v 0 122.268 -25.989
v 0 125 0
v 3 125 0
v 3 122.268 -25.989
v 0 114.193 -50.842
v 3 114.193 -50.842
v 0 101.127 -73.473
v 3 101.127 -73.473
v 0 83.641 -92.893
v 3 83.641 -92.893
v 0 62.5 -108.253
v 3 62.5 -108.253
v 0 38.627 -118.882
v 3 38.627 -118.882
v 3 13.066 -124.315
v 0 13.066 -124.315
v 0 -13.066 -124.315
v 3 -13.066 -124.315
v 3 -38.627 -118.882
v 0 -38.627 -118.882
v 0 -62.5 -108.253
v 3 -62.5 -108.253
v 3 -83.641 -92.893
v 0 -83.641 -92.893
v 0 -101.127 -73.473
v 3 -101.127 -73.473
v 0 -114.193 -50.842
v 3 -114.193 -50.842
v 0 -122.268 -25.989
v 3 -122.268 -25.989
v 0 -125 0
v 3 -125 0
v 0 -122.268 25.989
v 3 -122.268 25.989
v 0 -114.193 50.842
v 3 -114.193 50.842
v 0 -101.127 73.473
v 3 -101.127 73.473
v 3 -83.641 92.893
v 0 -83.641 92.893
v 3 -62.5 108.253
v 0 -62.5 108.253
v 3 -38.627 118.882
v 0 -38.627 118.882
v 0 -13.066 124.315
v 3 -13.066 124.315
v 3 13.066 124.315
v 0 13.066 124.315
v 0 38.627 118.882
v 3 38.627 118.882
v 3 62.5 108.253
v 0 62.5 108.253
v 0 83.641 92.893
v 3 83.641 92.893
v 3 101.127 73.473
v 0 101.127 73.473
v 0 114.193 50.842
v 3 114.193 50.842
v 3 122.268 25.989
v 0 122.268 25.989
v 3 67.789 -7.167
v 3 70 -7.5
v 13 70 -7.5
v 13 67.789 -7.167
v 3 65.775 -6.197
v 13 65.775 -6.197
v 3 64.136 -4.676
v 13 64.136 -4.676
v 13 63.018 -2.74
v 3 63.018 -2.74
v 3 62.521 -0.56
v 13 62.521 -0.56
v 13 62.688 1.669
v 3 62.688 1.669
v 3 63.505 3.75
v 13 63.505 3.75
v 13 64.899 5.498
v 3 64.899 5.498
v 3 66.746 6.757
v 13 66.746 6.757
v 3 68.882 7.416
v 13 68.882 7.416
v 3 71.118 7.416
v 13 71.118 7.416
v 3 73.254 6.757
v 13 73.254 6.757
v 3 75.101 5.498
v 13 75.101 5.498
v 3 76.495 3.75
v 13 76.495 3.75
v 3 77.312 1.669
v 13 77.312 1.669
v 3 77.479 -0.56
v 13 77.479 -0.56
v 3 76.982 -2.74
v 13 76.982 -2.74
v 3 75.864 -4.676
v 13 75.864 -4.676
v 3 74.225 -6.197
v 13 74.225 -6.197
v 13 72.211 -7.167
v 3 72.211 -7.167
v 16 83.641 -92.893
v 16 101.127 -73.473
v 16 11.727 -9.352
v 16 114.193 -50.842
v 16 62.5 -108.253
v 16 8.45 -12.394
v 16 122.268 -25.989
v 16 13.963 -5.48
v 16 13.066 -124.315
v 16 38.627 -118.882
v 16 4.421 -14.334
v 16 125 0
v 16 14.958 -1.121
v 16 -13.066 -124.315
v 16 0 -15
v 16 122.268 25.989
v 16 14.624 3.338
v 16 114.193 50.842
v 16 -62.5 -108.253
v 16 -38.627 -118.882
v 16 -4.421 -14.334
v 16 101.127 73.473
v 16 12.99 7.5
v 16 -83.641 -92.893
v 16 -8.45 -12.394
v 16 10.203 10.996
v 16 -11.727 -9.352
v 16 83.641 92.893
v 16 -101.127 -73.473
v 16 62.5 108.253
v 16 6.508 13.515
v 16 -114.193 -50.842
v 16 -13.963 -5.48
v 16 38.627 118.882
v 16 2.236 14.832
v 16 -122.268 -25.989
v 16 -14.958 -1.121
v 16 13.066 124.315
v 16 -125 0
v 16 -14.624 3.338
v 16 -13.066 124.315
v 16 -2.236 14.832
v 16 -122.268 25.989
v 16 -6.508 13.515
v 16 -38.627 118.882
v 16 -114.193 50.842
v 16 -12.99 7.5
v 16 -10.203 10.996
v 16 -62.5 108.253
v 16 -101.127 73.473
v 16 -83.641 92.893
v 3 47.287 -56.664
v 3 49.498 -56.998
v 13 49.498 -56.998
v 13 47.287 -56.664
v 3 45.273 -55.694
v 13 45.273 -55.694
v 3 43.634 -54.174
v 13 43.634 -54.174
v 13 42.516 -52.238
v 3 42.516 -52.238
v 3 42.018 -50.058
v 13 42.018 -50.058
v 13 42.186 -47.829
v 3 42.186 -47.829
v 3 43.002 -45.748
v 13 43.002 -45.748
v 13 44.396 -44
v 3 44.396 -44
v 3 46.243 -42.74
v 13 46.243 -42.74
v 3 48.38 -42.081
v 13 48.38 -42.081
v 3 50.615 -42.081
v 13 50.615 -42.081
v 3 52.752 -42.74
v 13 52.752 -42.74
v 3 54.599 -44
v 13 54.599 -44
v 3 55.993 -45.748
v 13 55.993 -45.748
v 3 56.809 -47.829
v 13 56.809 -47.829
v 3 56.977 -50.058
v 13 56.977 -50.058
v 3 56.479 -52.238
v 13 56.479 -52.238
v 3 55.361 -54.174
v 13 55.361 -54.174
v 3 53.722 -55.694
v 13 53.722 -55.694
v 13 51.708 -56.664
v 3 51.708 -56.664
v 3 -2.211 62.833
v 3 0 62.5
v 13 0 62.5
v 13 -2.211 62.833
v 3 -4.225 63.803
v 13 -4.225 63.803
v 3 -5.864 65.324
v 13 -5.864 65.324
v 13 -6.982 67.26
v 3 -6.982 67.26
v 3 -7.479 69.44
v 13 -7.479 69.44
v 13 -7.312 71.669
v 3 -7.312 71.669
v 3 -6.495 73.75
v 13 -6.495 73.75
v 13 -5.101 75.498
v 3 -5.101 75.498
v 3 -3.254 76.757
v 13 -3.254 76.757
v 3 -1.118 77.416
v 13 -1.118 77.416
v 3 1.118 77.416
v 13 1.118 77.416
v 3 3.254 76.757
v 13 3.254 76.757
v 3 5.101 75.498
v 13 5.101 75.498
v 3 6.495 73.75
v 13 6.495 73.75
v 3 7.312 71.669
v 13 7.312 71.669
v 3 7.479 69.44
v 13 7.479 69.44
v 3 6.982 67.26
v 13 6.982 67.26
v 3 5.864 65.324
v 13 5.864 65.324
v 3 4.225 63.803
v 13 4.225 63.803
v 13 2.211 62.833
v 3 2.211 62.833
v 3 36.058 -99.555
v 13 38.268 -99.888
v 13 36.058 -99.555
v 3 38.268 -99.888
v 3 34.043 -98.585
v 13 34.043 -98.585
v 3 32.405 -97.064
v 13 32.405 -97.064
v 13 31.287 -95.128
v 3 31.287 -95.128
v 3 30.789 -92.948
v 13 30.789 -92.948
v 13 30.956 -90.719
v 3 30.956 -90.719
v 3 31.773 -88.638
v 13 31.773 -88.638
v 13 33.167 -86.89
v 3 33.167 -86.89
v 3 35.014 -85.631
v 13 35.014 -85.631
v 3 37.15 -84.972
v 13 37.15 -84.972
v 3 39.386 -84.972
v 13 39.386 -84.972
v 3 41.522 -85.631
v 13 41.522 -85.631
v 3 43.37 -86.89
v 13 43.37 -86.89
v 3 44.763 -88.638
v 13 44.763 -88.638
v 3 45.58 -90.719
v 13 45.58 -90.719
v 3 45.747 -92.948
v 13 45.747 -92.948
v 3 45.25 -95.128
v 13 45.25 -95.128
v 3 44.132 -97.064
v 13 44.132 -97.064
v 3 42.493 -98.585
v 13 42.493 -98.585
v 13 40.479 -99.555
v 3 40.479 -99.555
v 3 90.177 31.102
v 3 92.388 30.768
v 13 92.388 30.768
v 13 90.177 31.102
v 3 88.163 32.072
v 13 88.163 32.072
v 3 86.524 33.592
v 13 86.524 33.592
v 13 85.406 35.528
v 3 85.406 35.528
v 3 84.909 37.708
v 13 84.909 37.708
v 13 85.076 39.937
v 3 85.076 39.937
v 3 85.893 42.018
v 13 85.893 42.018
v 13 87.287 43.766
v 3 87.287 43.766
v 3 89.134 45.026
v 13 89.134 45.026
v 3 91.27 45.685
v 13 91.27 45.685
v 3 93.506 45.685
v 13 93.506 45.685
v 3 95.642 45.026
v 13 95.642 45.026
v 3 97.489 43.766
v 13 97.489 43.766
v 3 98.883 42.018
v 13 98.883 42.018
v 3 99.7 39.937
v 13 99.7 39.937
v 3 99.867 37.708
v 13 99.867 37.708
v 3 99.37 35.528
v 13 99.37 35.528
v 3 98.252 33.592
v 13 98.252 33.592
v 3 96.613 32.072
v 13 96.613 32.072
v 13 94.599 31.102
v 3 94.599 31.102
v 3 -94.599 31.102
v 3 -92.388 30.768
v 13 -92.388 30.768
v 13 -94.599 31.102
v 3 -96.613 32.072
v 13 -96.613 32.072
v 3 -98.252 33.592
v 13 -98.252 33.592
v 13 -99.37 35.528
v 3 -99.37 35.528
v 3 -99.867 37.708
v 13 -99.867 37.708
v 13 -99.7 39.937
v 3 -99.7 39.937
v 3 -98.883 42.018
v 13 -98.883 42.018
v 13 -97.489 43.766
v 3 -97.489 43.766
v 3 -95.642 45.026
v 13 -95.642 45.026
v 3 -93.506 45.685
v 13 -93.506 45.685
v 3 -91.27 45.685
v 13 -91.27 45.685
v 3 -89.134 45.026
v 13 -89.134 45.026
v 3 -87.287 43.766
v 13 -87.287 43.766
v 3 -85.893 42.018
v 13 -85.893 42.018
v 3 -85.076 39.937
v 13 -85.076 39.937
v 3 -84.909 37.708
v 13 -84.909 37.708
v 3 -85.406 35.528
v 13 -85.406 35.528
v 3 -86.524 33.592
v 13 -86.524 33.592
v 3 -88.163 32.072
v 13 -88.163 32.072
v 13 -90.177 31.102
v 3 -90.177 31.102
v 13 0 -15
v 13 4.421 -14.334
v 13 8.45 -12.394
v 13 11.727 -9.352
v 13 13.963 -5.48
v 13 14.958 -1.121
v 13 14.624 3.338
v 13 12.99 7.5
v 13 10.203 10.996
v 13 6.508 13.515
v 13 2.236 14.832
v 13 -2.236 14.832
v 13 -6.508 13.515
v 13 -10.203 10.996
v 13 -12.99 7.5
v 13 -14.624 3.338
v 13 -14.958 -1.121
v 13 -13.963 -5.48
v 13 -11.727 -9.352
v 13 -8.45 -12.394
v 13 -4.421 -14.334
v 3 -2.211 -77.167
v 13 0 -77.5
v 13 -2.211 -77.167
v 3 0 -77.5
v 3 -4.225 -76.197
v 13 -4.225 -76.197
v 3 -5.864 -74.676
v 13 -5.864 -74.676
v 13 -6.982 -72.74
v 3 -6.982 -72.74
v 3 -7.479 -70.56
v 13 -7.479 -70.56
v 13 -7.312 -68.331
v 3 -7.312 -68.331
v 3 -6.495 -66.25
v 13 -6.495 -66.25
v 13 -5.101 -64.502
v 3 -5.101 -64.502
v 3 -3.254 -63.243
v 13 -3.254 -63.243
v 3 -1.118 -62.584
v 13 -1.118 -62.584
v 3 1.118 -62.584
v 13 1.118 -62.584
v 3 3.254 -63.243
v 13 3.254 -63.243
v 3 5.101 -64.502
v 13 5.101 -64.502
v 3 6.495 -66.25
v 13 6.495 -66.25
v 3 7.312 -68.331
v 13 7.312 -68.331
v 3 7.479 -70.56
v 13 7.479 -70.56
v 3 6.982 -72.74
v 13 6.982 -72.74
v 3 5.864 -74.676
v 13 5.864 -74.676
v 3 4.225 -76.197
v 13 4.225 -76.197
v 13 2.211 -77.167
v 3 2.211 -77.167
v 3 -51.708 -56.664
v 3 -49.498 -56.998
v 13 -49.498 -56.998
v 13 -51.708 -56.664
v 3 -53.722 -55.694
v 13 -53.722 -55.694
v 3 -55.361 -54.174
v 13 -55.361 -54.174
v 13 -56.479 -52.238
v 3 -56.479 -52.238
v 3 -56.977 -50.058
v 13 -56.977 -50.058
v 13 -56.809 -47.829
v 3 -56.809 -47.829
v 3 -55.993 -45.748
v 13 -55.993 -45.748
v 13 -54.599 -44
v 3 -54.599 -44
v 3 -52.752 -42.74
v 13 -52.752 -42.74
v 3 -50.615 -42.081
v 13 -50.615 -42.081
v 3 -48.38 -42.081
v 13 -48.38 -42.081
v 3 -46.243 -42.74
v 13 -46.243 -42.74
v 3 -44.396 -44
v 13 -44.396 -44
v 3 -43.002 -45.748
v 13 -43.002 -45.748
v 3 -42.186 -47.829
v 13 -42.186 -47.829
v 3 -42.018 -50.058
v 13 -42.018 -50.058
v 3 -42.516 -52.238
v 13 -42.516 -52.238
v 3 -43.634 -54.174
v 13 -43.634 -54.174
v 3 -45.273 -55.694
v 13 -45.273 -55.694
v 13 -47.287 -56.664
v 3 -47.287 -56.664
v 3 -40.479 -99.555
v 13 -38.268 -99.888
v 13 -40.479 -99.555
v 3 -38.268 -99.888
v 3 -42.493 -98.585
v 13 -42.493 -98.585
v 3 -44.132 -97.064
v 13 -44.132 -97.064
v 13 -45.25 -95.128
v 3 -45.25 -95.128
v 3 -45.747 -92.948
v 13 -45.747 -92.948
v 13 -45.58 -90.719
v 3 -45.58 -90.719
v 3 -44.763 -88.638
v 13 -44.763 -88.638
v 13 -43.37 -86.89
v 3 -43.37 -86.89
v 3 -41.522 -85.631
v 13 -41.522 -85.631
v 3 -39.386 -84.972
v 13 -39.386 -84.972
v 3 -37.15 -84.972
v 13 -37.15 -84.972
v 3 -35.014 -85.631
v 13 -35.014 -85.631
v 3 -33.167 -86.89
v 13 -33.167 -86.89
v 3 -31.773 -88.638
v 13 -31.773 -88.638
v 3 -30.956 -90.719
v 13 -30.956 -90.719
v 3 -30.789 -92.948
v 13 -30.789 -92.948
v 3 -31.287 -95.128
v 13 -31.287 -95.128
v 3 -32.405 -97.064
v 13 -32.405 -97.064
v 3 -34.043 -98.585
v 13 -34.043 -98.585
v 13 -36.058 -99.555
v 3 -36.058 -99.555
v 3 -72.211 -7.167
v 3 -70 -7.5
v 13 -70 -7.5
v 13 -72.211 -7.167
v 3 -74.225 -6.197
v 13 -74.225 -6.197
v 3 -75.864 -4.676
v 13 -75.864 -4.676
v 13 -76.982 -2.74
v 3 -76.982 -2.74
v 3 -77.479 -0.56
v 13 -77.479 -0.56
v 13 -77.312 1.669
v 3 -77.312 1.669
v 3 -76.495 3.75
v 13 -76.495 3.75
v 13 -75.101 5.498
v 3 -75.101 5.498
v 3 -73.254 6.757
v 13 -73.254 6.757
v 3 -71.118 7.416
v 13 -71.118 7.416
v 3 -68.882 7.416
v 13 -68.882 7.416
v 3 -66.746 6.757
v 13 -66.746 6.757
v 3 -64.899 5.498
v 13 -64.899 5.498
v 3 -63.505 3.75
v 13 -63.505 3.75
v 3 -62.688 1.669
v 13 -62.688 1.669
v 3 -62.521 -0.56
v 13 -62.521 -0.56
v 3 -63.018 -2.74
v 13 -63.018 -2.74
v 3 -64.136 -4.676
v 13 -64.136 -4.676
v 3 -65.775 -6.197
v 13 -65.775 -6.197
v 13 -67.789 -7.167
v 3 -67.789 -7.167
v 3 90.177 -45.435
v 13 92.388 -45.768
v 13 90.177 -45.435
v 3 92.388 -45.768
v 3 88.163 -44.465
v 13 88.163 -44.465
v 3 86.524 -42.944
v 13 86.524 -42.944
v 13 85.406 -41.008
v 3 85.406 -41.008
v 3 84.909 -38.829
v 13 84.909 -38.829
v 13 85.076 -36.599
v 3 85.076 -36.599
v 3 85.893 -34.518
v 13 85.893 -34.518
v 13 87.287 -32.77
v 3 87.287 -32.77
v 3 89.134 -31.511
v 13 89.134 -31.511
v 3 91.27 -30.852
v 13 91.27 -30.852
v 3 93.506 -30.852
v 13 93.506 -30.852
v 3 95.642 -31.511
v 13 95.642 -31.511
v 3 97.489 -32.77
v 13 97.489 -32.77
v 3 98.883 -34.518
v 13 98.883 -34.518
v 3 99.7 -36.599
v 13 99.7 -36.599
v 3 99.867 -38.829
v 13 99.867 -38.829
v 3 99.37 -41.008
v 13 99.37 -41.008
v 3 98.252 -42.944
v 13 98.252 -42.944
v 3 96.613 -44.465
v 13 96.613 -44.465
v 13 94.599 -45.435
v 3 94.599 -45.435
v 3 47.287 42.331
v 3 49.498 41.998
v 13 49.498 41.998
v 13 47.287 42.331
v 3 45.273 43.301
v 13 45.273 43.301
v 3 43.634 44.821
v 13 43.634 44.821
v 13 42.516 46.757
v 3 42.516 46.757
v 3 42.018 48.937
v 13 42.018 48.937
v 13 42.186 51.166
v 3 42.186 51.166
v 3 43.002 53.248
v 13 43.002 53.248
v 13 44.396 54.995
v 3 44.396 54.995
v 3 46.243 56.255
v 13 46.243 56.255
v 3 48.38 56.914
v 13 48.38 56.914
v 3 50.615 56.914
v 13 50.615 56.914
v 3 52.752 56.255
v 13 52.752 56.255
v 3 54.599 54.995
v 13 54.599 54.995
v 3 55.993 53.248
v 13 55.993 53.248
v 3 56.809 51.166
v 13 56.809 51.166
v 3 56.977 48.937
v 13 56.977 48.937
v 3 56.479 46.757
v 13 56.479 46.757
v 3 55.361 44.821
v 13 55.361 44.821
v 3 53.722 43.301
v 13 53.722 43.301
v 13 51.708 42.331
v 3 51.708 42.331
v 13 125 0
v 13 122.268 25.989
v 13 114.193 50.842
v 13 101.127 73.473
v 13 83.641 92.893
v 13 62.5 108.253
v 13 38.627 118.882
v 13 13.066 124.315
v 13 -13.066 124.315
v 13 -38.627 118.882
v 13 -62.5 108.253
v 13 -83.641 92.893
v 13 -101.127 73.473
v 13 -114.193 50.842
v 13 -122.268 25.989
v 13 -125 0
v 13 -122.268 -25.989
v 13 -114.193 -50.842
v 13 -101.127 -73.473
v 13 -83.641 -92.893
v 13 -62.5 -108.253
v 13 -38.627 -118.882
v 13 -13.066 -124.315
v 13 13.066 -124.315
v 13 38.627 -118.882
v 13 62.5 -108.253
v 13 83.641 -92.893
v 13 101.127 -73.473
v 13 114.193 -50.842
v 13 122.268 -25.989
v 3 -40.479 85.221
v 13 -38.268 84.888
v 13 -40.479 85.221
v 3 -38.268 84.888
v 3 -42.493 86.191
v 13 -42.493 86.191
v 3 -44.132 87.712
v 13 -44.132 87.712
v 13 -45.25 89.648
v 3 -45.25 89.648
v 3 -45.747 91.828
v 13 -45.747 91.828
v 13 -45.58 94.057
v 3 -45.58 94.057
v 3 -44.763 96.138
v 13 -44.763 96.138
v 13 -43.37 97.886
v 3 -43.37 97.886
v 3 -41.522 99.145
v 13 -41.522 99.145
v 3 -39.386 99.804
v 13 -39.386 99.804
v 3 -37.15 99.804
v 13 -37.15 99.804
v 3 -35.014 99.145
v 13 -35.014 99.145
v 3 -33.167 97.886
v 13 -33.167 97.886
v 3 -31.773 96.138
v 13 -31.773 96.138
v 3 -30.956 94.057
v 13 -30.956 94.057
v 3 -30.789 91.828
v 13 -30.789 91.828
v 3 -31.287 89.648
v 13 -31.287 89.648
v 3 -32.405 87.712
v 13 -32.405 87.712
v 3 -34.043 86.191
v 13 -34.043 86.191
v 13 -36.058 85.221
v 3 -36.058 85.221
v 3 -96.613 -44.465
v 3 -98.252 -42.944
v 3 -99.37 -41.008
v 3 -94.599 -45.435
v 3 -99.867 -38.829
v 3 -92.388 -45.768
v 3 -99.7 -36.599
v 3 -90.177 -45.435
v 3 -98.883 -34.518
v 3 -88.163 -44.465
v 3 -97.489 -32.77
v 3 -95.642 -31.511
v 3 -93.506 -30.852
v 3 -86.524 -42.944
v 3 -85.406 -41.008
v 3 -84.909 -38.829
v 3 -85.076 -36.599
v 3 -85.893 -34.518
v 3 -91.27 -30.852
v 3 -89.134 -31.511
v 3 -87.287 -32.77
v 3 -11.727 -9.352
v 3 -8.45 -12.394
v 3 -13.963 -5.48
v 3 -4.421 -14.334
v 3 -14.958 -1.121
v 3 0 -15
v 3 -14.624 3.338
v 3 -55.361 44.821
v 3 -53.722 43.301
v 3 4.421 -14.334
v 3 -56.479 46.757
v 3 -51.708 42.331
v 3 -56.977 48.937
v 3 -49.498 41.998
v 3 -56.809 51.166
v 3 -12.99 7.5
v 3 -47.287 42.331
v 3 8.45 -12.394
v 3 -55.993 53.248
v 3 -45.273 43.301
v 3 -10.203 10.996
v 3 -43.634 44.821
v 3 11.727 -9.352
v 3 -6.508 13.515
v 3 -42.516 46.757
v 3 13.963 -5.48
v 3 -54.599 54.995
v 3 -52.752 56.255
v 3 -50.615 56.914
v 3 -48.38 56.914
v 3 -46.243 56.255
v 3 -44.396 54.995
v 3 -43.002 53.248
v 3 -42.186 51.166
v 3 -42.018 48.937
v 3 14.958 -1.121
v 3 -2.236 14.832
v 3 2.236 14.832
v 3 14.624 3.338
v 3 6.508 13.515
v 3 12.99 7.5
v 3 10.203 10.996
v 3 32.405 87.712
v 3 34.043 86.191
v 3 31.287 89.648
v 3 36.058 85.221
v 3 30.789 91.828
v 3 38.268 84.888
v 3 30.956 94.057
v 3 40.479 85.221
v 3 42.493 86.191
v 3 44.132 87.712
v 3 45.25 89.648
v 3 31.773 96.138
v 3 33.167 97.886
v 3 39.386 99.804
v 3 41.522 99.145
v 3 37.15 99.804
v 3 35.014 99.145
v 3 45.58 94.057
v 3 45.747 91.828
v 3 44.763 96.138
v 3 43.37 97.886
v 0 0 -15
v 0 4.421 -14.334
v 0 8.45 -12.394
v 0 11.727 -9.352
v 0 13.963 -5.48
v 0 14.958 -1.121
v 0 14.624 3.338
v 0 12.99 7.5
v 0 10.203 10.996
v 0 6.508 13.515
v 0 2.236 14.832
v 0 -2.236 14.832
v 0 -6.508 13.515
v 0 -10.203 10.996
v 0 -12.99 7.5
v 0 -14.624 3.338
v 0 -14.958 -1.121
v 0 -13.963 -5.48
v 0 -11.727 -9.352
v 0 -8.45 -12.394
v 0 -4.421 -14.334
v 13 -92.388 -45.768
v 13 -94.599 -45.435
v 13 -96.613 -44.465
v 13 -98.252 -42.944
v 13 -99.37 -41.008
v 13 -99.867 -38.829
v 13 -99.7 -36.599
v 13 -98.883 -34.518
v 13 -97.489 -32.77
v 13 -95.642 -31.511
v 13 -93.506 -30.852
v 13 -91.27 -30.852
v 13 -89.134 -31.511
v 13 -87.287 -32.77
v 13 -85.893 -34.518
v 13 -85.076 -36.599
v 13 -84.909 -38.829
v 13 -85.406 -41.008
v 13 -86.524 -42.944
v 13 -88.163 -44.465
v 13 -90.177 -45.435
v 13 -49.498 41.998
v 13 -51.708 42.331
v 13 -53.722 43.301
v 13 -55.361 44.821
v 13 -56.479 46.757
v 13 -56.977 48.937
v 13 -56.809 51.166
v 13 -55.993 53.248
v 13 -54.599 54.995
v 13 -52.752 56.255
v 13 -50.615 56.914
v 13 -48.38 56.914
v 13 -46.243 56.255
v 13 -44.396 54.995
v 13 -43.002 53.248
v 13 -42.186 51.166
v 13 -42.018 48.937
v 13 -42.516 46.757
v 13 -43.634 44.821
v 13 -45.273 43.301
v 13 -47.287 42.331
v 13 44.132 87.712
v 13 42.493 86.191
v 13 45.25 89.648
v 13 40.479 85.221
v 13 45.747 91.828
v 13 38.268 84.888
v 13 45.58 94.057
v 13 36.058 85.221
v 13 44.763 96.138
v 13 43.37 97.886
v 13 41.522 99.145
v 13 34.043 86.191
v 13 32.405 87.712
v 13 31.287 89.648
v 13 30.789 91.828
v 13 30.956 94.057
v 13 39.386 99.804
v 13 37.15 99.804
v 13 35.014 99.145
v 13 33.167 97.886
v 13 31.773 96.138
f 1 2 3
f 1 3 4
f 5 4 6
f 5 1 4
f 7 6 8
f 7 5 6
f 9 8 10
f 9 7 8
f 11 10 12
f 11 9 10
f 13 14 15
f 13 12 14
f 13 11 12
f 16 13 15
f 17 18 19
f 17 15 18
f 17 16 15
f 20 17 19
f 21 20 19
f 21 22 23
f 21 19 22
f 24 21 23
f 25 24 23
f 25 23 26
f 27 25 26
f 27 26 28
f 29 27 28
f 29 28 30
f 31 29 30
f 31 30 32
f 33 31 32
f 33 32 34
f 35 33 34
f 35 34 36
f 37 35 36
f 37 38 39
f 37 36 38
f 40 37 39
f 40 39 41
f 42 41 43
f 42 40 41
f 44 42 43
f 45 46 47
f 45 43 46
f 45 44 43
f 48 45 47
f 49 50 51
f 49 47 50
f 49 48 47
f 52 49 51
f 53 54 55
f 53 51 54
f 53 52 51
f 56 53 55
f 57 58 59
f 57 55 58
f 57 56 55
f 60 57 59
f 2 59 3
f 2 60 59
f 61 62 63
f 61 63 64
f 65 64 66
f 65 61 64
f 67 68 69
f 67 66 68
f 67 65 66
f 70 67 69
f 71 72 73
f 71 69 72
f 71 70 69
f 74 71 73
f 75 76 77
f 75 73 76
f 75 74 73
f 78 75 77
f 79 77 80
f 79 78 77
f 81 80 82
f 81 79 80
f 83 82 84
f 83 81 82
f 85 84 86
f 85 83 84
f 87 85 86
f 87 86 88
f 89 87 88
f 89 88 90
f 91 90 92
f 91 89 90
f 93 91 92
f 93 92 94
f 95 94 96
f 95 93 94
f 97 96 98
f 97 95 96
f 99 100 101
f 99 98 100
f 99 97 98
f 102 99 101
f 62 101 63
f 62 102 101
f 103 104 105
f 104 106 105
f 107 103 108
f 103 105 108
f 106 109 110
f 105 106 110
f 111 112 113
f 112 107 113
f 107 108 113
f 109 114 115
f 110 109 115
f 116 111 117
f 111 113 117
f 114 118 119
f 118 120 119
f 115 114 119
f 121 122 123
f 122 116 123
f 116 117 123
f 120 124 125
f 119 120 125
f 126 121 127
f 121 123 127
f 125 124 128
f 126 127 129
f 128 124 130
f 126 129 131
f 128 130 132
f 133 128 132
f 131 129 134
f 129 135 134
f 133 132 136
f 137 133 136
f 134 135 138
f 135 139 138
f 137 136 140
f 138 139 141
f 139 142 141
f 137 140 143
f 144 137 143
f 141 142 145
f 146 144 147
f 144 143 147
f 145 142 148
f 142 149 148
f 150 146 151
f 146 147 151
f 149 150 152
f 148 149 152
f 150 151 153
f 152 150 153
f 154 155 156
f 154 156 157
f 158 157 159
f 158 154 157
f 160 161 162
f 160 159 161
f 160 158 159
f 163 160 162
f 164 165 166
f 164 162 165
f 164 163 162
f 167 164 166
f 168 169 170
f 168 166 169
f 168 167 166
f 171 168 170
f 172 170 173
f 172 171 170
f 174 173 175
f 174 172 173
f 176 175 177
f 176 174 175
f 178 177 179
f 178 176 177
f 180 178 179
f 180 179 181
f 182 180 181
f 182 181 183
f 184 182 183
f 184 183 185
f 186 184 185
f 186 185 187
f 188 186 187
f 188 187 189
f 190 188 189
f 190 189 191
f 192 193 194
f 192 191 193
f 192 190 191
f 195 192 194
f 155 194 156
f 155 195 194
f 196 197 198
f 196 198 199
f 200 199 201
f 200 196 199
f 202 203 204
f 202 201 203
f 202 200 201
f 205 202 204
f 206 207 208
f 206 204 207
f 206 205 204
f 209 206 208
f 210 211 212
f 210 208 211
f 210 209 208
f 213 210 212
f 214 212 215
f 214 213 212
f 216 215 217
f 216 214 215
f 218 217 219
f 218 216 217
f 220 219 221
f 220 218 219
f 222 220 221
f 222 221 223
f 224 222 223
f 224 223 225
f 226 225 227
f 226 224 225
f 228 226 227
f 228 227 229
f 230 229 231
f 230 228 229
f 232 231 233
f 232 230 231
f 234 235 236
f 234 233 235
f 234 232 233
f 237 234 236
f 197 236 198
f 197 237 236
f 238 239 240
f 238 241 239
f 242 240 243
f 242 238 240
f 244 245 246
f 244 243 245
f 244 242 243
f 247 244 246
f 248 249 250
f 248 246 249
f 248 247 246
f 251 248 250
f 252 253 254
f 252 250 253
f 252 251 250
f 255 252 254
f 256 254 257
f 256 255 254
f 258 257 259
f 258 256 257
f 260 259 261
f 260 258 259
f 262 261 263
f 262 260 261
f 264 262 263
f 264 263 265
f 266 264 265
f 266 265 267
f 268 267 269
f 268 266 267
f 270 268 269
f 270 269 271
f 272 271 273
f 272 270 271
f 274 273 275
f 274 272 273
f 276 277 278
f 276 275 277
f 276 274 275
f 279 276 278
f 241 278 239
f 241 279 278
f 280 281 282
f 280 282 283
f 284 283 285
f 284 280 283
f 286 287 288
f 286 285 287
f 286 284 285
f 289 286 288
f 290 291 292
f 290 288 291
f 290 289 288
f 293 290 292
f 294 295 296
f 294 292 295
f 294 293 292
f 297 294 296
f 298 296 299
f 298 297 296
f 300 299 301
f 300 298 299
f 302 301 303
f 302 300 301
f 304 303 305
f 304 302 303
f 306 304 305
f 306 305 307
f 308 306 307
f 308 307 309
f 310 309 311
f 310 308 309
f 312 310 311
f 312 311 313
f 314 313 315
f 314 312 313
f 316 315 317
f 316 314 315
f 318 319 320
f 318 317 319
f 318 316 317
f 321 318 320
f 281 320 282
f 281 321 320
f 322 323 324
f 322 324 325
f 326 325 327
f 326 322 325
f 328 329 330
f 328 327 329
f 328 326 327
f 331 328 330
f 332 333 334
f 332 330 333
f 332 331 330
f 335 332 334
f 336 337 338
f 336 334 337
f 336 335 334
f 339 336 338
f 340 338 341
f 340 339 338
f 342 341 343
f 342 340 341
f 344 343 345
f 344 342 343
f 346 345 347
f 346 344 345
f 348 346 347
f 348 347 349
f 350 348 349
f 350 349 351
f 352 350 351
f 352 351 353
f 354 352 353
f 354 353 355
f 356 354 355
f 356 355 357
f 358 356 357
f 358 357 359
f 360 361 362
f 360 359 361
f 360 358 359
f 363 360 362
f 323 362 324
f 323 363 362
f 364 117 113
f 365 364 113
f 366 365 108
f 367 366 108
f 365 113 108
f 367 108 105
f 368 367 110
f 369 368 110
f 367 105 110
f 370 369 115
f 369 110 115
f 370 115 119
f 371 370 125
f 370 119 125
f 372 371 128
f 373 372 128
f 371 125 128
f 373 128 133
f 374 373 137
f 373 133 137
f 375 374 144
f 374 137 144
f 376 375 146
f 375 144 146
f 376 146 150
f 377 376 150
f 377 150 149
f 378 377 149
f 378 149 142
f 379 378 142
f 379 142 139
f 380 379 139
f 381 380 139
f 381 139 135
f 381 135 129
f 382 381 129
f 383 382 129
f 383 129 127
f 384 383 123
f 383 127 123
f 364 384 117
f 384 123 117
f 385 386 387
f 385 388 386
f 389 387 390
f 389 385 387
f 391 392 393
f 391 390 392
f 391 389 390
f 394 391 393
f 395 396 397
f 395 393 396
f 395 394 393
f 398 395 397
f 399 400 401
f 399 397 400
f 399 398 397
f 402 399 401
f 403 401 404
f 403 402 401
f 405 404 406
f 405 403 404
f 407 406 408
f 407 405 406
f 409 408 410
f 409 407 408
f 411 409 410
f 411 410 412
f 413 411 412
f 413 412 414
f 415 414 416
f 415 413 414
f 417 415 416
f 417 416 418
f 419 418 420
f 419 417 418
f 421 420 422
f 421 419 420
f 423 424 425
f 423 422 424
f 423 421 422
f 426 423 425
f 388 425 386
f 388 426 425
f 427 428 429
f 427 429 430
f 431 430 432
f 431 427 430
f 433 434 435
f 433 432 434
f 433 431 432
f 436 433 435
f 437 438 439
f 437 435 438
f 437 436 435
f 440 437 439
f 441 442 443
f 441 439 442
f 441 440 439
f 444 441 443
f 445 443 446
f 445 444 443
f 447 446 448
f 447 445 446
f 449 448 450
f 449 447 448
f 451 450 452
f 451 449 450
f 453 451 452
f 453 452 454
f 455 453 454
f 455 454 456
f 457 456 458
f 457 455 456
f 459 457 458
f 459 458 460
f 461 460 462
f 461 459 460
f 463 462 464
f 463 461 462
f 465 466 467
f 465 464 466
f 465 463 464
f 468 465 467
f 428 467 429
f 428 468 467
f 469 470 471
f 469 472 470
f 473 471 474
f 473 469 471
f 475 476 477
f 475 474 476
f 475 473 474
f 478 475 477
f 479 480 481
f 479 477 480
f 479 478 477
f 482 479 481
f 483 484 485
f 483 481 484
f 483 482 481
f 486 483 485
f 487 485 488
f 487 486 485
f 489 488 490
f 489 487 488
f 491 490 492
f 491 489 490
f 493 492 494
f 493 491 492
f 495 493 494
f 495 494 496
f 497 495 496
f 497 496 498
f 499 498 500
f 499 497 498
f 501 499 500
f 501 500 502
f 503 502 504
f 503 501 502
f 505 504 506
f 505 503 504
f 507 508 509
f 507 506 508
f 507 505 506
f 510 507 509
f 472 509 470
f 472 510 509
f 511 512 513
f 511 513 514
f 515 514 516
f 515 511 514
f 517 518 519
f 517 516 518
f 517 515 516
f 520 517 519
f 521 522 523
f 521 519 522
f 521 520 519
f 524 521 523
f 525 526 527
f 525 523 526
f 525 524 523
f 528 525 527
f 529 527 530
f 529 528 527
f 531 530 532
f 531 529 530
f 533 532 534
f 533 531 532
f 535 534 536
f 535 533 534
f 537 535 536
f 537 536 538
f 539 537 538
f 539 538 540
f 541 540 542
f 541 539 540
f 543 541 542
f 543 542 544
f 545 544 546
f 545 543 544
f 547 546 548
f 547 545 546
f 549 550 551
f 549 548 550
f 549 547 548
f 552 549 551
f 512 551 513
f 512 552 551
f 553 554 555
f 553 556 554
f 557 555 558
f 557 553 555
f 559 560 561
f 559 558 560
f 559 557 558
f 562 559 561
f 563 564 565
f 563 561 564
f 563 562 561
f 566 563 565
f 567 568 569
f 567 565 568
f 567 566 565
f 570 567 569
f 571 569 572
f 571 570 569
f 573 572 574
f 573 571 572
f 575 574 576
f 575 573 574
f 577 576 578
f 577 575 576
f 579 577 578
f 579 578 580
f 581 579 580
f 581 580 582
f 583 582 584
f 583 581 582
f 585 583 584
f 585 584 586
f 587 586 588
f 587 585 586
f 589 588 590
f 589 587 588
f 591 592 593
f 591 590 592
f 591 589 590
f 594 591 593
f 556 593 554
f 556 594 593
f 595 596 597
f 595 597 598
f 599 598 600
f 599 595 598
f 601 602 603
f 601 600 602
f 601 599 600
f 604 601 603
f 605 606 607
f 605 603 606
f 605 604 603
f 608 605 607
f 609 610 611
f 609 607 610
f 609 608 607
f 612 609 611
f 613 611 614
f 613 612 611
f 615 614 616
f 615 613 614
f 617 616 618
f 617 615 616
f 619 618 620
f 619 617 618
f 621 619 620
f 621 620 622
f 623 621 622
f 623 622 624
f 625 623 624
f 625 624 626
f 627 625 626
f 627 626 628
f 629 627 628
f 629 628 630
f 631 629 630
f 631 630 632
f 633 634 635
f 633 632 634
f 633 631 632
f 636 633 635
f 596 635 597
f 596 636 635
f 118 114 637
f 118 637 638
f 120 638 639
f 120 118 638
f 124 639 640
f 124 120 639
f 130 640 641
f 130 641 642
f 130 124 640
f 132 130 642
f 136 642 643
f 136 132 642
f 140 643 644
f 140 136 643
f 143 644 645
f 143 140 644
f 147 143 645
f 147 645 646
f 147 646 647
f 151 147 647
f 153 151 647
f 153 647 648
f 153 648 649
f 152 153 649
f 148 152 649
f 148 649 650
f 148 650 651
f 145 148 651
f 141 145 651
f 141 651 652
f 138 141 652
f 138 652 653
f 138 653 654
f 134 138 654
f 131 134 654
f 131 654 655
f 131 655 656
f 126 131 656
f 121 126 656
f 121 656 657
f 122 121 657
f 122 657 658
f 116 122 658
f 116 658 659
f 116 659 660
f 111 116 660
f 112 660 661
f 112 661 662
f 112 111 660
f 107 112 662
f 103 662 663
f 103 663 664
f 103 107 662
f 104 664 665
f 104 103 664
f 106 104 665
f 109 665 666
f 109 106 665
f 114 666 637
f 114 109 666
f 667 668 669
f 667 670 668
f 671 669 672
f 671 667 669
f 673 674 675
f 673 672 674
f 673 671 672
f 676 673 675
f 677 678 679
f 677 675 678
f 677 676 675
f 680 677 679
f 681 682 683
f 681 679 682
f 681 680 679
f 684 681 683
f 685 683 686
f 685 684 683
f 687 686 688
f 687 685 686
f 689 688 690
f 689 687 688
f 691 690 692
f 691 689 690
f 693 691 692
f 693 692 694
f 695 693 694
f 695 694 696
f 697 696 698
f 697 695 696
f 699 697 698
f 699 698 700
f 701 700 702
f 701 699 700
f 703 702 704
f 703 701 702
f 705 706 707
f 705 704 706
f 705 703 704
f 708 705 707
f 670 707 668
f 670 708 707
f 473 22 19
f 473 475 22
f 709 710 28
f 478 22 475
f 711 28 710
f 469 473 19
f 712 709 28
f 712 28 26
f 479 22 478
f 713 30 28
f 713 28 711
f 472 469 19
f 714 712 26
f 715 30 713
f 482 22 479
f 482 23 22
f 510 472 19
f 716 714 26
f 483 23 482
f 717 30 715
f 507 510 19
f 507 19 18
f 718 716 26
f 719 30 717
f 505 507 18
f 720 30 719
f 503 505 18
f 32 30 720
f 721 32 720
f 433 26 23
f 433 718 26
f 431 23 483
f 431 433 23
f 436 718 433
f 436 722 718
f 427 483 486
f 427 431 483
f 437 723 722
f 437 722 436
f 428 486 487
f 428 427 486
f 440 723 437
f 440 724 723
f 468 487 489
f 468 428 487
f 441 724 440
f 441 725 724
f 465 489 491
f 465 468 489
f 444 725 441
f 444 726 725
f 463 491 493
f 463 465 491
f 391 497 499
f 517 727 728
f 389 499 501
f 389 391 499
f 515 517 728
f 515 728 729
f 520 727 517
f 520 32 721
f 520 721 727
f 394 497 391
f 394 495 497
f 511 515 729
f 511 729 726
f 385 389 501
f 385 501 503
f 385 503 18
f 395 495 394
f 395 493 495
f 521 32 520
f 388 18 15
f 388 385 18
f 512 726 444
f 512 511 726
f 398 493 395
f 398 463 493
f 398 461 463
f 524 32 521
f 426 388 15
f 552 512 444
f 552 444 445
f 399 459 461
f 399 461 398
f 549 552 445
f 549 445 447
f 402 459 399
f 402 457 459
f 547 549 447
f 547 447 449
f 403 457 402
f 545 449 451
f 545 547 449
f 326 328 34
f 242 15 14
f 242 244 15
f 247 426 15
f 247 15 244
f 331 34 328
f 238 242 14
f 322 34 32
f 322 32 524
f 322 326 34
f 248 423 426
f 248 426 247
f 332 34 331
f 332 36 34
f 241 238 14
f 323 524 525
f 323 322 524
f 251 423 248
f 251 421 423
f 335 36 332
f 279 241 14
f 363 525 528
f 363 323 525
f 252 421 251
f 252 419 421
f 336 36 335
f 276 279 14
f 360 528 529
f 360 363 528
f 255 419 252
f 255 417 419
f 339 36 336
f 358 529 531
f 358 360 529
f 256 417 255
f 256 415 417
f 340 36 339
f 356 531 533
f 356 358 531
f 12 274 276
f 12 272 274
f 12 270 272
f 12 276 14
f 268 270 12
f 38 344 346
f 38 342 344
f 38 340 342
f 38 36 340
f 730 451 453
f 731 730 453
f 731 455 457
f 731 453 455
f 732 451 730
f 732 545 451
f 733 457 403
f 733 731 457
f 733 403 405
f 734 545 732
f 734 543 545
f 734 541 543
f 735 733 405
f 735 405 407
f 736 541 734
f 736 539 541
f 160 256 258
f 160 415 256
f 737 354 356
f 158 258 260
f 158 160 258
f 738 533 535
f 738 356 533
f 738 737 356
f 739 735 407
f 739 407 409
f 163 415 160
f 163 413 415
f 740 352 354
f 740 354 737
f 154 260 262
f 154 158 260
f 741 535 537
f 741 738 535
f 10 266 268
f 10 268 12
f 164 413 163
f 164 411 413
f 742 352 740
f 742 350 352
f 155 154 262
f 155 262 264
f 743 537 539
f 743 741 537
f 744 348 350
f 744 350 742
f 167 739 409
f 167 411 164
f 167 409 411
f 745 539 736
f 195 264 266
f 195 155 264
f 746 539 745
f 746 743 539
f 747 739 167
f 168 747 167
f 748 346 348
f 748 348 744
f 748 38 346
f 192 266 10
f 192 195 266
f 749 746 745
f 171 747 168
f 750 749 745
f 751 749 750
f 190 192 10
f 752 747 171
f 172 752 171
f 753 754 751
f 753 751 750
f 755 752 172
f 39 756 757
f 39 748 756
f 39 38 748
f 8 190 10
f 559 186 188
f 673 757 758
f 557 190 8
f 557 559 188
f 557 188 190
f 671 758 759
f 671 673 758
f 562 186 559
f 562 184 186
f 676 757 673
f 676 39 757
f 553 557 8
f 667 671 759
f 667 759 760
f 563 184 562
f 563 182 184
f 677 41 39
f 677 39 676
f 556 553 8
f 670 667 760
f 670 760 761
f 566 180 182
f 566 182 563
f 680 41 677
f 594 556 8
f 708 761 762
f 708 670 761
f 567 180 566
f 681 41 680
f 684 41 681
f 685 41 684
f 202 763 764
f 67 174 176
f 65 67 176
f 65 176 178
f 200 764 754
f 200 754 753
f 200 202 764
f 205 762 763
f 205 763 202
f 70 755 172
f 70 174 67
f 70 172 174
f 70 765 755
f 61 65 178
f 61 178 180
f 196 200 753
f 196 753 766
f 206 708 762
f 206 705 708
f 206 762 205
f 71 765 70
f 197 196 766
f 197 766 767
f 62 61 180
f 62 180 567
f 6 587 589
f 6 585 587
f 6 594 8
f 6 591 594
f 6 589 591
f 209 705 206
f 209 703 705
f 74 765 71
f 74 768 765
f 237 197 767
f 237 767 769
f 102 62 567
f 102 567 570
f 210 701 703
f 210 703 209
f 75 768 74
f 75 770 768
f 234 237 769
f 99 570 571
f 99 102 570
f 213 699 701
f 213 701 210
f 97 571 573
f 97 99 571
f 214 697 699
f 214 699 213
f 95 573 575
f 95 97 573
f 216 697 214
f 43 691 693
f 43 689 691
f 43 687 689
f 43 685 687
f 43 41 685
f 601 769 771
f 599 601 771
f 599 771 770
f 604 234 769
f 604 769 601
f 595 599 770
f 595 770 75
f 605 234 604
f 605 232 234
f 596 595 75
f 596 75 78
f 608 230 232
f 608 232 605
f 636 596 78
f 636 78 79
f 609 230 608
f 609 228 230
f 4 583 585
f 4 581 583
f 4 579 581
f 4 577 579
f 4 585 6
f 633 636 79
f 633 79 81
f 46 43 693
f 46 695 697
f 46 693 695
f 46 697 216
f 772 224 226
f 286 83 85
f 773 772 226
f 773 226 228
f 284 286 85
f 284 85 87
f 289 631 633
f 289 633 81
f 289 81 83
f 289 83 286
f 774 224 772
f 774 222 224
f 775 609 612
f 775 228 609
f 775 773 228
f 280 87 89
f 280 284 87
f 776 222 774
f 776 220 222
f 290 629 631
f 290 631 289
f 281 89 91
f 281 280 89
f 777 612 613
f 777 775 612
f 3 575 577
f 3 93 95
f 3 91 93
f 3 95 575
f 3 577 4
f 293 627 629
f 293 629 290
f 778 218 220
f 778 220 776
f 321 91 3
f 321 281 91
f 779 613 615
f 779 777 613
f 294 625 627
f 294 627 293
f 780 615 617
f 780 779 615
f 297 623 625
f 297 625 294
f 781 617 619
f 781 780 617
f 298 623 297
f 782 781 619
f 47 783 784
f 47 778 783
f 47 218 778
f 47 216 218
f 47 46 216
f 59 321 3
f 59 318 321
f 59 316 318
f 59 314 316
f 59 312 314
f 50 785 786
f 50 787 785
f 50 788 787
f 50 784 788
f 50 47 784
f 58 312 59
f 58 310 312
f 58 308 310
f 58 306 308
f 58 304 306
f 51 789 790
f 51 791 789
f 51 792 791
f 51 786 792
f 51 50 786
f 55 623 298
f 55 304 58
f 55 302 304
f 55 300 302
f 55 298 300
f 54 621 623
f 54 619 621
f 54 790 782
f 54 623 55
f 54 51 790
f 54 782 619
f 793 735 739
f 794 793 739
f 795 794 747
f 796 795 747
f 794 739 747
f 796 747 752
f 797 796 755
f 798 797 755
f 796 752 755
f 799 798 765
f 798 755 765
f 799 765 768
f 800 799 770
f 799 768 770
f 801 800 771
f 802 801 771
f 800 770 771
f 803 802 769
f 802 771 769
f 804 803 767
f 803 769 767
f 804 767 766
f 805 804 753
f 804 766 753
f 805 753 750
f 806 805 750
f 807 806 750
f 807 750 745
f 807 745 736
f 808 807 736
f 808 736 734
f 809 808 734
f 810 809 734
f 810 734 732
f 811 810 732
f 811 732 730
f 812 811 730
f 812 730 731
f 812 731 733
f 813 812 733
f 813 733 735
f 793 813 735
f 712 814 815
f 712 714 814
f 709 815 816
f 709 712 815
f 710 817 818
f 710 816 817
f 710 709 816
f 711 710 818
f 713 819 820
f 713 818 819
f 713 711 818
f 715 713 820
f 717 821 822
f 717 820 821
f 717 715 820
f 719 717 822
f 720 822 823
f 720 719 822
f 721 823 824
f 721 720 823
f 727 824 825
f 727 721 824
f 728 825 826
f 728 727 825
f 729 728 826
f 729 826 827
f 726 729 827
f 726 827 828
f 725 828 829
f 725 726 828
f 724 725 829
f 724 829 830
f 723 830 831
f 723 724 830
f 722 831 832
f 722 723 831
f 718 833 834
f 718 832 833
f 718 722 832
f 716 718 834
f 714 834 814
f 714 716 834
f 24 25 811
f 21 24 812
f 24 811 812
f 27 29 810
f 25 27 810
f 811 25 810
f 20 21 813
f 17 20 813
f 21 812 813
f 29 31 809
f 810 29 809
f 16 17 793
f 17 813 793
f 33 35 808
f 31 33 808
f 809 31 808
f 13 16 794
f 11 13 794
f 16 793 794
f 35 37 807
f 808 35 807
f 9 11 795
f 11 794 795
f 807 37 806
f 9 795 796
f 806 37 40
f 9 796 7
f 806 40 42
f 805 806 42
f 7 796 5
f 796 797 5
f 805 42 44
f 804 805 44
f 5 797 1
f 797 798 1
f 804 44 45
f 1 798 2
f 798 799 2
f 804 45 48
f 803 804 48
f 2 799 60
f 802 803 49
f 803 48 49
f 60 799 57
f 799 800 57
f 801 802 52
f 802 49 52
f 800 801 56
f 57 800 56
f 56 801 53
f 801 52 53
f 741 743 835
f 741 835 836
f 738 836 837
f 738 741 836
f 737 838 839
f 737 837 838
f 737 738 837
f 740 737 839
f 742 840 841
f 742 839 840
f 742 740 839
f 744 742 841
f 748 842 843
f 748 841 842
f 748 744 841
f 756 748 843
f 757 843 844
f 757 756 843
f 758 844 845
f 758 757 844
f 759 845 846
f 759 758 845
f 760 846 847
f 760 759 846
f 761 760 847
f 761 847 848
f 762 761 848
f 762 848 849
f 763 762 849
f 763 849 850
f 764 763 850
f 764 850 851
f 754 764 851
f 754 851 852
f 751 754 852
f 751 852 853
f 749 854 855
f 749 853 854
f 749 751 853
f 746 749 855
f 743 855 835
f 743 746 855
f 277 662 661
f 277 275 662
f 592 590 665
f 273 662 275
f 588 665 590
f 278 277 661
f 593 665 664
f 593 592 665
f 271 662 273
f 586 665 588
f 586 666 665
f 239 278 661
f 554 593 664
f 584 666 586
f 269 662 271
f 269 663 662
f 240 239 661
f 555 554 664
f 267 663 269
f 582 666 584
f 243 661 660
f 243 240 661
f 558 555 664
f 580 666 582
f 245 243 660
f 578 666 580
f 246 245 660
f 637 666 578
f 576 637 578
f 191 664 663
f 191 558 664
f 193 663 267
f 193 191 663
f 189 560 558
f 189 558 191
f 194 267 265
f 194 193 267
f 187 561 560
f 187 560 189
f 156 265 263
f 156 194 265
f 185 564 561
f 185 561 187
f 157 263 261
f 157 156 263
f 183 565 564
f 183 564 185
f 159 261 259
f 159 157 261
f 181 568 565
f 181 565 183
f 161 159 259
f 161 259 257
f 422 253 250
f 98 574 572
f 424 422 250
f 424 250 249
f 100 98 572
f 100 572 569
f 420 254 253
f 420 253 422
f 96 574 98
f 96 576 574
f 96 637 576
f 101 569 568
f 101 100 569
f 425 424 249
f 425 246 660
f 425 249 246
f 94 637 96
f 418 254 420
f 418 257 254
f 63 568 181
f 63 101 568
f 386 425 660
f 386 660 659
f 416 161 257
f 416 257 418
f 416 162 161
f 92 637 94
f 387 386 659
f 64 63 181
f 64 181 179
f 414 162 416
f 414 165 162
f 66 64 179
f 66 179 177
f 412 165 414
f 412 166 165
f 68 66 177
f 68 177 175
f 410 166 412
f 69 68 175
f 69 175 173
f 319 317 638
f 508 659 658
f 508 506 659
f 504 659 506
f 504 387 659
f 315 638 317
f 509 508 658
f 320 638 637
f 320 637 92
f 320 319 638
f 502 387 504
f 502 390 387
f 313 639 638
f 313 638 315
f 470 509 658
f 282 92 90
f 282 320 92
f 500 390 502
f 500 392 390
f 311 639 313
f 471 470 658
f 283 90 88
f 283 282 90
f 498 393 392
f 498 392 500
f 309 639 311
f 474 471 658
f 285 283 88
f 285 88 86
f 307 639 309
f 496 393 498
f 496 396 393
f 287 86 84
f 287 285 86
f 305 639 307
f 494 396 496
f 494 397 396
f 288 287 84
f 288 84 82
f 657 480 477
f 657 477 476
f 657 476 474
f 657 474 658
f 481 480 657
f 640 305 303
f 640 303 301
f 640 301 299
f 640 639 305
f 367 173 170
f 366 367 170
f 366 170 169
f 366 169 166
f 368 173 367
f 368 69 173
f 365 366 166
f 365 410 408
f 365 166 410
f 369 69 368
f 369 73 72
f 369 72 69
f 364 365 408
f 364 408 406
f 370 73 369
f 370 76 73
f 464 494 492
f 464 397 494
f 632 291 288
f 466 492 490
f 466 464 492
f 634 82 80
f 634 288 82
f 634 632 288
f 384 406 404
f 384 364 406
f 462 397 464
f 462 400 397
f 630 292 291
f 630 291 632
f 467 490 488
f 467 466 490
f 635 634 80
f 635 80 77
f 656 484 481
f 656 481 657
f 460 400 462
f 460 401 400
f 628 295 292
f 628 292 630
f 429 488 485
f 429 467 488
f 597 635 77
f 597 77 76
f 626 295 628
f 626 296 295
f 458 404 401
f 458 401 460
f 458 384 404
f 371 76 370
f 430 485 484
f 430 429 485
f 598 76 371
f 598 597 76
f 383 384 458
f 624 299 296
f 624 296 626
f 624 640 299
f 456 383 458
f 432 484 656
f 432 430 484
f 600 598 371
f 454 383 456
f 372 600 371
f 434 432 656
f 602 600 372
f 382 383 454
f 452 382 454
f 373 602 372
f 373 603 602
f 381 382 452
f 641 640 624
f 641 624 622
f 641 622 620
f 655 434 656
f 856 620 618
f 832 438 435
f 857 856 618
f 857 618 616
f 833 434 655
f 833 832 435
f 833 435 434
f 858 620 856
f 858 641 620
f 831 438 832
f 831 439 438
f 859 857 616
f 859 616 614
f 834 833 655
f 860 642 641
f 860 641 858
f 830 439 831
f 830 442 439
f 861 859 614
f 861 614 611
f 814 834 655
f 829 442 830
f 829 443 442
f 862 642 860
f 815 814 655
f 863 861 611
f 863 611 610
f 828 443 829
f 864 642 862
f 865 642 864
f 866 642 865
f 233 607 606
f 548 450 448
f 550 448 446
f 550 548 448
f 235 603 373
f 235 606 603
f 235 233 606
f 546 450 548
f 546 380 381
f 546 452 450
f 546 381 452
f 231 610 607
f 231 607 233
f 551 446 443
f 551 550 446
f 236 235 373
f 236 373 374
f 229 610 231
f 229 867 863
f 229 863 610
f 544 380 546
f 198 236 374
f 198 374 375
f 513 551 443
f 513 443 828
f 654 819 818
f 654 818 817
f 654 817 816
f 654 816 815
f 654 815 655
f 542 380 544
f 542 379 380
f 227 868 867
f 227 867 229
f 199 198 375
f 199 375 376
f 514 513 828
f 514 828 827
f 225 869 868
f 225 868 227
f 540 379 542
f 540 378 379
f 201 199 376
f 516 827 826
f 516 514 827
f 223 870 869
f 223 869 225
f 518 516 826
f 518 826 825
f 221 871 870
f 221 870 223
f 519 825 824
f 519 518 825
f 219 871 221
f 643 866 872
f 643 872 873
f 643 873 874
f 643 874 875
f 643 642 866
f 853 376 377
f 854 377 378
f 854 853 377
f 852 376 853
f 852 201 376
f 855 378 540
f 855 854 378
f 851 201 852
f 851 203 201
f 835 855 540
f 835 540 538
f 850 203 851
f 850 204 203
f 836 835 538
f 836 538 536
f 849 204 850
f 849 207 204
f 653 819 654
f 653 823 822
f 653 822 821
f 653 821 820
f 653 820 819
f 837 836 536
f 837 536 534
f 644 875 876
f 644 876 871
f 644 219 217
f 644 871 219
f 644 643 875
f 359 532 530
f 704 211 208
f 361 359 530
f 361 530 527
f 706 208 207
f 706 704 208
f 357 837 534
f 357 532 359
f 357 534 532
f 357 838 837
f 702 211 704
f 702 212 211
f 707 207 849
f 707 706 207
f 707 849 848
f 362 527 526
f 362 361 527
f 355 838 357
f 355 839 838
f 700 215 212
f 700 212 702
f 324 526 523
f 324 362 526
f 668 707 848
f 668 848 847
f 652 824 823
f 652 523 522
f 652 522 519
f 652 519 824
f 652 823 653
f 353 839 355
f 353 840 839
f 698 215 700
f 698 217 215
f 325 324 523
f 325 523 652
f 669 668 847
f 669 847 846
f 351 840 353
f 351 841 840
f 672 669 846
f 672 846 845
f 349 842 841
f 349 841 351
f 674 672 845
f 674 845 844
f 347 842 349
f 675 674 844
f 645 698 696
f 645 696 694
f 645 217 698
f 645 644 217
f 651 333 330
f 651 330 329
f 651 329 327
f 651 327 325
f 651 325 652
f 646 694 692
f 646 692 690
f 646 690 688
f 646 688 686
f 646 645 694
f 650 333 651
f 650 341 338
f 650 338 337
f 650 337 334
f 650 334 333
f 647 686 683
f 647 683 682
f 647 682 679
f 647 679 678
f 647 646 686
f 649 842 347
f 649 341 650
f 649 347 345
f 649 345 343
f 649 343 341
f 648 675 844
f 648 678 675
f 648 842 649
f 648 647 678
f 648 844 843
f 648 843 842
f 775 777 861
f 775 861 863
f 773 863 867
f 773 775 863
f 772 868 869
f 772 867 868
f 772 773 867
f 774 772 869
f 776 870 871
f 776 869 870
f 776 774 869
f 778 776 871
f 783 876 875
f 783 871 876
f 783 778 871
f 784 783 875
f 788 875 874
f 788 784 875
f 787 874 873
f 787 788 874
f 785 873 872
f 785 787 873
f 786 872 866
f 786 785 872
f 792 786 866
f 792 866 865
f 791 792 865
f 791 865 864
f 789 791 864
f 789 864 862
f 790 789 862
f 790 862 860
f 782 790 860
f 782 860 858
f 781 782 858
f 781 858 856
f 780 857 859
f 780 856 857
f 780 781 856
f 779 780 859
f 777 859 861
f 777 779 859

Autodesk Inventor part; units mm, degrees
ref_plane "YZ Plane" through (0, 0, 0) normal (1, 0, 0) x (0, 1, 0)
ref_plane "XZ Plane" through (0, 0, 0) normal (0, 1, 0) x (-1, 0, 0)
ref_plane "XY Plane" through (0, 0, 0) normal (0, 0, 1) x (1, 0, 0)
sketch "Sketch1" plane through (0, 0, 0) normal (1, 0, 0) x (0, 1, 0)
  circle A0 centre (0, 0) radius 125
  dimension "d0" = 250
extrude "Extrusion1" add sketch "Sketch1" along normal blind 3
sketch "Sketch2" plane through (3, 0, 0) normal (1, 0, 0) x (0, 0, -1)
  circle A0 centre (0, 0) radius 15
  line L0 (0, 0) -> (0, 70) construction
  circle A1 centre (0, 70) radius 7.5
  circle A2 centre (-49.4975, 49.4975) radius 7.5
  circle A3 centre (-70, 0) radius 7.5
  circle A4 centre (-49.4975, -49.4975) radius 7.5
  circle A5 centre (0, -70) radius 7.5
  circle A6 centre (49.4975, -49.4975) radius 7.5
  circle A7 centre (70, 0) radius 7.5
  circle A8 centre (49.4975, 49.4975) radius 7.5
  line L1 (0, 0) -> (92.388, 38.2683) construction
  line L2 (0, 0) -> (100, 0) construction
  circle A9 centre (92.388, 38.2683) radius 7.5
  circle A10 centre (38.2683, 92.388) radius 7.5
  circle A11 centre (-38.2683, 92.388) radius 7.5
  circle A12 centre (-92.388, 38.2683) radius 7.5
  circle A13 centre (-92.388, -38.2683) radius 7.5
  circle A14 centre (-38.2683, -92.388) radius 7.5
  circle A15 centre (38.2683, -92.388) radius 7.5
  circle A16 centre (92.388, -38.2683) radius 7.5
  dimension "d3" = 30
  dimension "d4" = 70
  dimension "d5" = 15
  dimension "d8" = 360
  dimension "d10" = 100
  dimension "d11" = 22.5
  dimension "d12" = 15
  dimension "d15" = 360
extrude "Extrusion2" add sketch "Sketch2" along normal blind 10 contours A1 | A2 | A3 | A4 | A5 | A6 | A7 | A8 | A9 | A10 | A11 | A12 | A13 | A14 | A15 | A16
ref_plane "Work Plane1" through (8, -49.4975, 49.4975) normal (1, 0, 0) x (0, 0, -1)
mirror "Mirror1" about plane through (8, -49.4975, 49.4975) normal (1, 0, 0) of "Extrusion1"
sketch "Sketch3" plane through (16, 0, 0) normal (1, 0, 0) x (0, 0, -1)
  circle A0 centre (0, 0) radius 15
  dimension "d20" = 30
extrude "Extrusion3" cut sketch "Sketch3" against normal through all
properties part number "Base Plate"
